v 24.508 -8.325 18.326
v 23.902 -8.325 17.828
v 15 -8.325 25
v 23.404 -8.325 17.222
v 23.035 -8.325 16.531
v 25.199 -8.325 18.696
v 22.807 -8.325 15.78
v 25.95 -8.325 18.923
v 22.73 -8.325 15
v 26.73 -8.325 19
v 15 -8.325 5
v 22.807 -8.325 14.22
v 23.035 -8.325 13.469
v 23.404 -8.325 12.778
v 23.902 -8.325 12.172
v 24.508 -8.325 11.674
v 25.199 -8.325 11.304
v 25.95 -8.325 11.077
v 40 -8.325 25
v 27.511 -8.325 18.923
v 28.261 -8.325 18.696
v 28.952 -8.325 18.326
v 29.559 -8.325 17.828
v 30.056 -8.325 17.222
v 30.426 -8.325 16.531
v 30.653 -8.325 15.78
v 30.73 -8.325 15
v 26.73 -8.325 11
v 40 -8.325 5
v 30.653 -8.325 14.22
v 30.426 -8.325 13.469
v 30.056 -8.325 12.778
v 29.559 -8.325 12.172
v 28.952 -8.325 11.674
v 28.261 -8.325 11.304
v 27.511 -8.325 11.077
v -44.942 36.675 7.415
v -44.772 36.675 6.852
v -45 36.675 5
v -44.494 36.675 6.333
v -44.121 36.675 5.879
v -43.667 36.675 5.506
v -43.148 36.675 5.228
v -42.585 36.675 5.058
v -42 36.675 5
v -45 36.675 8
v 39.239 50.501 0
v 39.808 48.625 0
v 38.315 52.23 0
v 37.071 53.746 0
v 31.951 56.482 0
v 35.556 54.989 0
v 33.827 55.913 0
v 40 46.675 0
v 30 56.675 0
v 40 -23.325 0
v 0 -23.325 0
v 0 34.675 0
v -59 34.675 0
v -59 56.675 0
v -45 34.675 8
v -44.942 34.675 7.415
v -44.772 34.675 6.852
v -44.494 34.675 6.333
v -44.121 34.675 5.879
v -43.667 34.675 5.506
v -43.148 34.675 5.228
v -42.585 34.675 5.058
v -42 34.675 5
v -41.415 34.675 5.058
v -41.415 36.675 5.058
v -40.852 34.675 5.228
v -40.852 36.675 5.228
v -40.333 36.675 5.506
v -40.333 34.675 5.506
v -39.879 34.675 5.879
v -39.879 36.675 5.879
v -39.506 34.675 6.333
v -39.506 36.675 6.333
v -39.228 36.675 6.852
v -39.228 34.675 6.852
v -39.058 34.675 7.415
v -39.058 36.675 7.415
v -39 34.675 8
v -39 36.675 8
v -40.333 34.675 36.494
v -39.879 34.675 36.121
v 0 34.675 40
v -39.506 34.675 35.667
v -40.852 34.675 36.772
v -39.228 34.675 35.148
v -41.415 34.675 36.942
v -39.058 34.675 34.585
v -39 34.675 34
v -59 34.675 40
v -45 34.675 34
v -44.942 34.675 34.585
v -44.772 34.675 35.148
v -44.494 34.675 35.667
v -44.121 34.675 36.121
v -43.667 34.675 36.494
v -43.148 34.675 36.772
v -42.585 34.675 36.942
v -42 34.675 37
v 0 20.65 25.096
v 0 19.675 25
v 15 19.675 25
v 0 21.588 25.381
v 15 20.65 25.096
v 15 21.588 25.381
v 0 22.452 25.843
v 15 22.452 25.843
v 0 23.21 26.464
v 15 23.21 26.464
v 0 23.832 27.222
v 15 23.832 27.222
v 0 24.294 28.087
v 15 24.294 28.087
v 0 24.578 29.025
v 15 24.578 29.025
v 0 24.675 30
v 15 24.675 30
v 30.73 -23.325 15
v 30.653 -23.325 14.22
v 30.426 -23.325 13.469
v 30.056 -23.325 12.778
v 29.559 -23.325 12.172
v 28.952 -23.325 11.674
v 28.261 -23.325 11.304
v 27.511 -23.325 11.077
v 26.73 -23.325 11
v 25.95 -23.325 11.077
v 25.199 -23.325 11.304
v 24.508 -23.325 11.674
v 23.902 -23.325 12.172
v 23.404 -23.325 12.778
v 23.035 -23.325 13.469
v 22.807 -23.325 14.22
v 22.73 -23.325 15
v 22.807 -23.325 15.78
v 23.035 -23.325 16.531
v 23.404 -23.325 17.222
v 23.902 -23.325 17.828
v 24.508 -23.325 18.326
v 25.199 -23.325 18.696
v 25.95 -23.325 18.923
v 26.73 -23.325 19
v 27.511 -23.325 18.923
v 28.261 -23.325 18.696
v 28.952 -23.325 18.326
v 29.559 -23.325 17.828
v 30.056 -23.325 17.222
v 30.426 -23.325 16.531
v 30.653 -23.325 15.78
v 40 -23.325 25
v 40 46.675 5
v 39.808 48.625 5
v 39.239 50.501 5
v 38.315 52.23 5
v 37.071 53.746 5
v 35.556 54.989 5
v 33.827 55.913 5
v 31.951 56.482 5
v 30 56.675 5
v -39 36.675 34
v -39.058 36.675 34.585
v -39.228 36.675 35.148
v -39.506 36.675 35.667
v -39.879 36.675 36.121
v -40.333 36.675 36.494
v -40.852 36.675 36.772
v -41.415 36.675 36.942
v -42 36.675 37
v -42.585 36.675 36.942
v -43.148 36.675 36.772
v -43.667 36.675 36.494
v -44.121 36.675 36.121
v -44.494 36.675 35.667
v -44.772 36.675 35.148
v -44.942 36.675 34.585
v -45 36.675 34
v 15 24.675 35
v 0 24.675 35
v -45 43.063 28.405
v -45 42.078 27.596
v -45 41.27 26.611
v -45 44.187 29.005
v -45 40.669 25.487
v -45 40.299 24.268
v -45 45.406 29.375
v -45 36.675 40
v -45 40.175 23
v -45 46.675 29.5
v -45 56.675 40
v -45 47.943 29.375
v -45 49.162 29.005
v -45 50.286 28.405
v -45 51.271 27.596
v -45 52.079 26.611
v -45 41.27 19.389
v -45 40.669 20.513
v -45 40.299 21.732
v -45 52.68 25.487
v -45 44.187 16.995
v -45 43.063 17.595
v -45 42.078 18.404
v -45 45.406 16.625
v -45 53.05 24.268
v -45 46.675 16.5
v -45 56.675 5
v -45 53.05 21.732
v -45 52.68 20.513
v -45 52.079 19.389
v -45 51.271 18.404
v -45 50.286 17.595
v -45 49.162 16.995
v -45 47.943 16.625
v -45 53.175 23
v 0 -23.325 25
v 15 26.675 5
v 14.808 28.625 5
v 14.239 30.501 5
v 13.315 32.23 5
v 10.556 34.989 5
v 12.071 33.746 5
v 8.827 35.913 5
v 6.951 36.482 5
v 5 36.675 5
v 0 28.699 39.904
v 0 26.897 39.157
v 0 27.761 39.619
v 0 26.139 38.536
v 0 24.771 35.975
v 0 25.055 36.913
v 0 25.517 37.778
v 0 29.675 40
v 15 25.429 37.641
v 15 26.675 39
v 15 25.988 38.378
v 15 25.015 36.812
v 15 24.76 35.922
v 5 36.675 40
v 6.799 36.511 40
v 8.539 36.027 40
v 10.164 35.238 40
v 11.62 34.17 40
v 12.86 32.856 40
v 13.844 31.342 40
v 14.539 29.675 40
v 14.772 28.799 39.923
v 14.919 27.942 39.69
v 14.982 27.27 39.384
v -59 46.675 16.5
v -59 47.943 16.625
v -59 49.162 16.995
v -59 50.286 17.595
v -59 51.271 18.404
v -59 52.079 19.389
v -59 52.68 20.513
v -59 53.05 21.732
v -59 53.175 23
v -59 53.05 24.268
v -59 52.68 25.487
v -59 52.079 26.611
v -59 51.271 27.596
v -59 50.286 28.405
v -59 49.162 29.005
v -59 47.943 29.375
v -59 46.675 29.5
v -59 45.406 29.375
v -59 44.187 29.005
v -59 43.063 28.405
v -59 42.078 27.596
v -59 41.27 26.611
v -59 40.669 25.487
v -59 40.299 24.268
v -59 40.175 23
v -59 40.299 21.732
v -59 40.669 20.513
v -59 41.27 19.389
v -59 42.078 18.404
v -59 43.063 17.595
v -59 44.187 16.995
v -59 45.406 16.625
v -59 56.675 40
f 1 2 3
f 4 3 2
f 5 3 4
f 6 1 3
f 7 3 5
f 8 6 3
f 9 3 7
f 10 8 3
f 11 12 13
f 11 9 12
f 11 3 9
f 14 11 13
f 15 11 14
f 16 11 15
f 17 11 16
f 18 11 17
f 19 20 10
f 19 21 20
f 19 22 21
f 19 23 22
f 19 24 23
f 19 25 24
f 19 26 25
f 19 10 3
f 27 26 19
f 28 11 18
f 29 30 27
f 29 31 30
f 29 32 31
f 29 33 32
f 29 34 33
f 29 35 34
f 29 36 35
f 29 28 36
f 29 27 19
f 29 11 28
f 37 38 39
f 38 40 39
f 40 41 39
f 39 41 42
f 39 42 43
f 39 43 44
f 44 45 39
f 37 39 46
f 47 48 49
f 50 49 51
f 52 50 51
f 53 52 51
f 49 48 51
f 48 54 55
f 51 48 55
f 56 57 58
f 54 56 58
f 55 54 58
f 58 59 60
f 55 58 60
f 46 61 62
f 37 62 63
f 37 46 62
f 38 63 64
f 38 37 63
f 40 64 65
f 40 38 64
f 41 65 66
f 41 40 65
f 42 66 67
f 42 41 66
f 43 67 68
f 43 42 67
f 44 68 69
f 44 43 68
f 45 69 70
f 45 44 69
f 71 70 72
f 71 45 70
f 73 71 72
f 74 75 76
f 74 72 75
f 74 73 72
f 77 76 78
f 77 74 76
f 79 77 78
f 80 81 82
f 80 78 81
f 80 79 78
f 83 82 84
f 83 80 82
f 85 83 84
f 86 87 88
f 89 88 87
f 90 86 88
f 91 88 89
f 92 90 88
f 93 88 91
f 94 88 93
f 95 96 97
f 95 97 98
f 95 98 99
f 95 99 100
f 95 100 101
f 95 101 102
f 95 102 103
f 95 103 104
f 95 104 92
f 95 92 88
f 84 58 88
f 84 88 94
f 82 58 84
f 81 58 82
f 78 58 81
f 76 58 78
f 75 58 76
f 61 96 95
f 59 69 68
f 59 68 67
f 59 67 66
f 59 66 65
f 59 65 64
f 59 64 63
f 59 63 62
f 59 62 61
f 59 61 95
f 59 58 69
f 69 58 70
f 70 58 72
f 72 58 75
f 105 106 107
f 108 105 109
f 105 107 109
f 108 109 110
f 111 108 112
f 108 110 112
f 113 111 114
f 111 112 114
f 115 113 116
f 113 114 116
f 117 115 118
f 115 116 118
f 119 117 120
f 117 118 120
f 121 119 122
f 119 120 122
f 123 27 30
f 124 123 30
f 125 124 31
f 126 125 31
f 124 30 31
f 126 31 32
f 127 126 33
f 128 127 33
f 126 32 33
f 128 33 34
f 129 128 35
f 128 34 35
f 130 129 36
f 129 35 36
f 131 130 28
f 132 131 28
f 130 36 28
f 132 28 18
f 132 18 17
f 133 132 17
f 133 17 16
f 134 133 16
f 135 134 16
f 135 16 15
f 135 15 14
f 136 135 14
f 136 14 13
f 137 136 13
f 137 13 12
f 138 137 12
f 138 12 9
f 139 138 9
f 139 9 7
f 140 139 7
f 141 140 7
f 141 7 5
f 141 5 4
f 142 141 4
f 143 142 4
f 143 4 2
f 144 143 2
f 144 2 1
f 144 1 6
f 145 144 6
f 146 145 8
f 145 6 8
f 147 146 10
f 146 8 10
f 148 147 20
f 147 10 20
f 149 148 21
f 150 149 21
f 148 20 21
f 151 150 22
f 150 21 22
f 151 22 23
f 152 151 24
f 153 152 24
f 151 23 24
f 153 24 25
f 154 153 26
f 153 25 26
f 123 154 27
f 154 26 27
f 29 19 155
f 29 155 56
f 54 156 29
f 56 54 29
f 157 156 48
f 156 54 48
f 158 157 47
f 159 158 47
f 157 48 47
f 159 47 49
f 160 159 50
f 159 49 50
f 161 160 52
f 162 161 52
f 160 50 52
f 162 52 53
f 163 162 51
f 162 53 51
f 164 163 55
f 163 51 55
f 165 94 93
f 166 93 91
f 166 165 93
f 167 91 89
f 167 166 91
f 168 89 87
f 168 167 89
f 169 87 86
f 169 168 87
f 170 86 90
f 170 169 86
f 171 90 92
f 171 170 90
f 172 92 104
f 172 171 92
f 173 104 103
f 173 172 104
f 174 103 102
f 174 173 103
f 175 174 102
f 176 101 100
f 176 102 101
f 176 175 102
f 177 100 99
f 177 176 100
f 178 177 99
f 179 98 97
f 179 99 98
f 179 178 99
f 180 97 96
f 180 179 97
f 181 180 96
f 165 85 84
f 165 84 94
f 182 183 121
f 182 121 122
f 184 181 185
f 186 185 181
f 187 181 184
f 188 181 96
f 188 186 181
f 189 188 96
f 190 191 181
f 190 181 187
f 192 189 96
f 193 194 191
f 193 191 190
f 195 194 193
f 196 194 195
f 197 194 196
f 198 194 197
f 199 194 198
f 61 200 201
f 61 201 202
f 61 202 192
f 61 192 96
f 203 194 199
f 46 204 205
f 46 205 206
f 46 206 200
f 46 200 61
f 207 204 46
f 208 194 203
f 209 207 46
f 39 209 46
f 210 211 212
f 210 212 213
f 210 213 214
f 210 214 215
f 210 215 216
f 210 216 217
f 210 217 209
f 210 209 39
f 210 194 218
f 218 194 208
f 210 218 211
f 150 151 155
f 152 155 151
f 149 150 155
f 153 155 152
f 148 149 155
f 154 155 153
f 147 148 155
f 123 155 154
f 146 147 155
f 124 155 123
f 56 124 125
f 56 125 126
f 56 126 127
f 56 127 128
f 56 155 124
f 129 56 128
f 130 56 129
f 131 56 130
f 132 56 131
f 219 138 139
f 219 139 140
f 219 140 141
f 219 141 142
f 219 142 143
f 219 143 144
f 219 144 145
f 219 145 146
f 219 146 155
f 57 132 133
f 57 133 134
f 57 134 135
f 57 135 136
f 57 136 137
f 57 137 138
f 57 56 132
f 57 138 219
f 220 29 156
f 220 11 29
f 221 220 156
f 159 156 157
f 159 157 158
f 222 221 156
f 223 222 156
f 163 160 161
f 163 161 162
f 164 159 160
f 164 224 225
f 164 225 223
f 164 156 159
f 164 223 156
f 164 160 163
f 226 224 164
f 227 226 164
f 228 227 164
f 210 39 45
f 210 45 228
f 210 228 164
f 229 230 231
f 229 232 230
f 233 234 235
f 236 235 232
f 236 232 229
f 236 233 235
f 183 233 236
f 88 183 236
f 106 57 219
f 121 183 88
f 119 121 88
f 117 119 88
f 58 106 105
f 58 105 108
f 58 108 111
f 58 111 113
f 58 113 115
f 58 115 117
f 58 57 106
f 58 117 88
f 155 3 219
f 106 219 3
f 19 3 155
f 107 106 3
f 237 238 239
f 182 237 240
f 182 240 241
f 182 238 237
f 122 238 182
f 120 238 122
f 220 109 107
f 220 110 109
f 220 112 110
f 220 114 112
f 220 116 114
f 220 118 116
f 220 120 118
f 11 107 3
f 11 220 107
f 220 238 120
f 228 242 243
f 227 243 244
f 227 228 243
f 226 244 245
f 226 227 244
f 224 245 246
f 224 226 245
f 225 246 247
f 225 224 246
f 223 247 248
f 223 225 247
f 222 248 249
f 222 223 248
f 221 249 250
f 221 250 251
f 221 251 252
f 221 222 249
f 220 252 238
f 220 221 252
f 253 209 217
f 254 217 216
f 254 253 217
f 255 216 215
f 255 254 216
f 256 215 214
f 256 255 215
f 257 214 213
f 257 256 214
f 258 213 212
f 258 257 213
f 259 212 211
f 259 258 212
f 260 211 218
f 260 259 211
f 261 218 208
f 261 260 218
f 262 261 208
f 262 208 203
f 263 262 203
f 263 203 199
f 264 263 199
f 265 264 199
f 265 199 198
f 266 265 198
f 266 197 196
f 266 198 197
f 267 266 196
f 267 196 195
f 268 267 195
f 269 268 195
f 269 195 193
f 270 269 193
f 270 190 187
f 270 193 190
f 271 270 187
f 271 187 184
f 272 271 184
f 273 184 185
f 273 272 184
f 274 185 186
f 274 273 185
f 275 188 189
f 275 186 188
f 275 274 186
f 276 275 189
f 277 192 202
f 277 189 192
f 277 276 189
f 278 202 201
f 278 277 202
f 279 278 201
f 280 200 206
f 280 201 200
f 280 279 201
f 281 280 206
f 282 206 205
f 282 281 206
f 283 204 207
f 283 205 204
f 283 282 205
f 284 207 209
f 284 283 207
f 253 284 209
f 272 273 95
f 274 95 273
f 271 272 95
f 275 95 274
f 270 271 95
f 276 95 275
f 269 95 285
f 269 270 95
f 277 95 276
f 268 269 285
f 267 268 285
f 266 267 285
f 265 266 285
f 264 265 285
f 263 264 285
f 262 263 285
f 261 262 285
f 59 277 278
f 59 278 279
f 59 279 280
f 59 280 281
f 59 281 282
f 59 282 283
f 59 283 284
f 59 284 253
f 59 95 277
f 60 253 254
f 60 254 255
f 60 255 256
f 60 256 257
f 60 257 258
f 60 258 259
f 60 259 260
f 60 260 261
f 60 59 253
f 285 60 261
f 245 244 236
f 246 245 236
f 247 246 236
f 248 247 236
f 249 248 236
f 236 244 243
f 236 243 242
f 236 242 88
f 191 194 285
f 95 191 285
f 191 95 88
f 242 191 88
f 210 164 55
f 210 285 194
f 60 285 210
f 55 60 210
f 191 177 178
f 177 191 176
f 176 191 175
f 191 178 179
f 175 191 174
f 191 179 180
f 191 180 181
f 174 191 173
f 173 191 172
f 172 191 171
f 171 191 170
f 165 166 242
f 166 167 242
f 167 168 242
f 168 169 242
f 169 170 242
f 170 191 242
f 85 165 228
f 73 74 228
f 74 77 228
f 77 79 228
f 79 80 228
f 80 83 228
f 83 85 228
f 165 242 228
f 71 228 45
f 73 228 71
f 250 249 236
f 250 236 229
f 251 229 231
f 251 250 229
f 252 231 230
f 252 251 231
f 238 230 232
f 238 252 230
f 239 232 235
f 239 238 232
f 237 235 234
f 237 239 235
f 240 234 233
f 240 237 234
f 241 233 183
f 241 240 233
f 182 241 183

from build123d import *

# Parameters (mm, degrees)
BOSS_EXTRUDE1_DEPTH     = 40
SKETCH2_R               = 4
CUT_EXTRUDE1_DEPTH      = 30
CUT_EXTRUDE2_DEPTH      = 100
CUT_EXTRUDE2_DEPTH_BACK = 100
SKETCH3_R               = 6.5
SKETCH5_W               = 35
SKETCH5_H               = 20
CUT_EXTRUDE3_DEPTH      = 60
SKETCH6_W               = 5
SKETCH6_H               = 65
BOSS_EXTRUDE2_DEPTH     = 25
CUT_EXTRUDE4_DEPTH      = 10
FILLET1_R               = 10
SKETCH8_W               = 40
SKETCH8_H               = 48
CUT_EXTRUDE5_DEPTH      = 15
FILLET2_R               = 5


with BuildPart() as part:
    # Sketch1 → Boss-Extrude1 (new body)
    with BuildSketch(Plane.XY):
        Polygon((40, -23.325428286), (0, -23.325428286), (0, 34.674571714), (-59, 34.674571714), (-59, 56.674571714), (15, 56.674571714), (15, -8.325428286), (40, -8.325428286), align=None)
    extrude(amount=BOSS_EXTRUDE1_DEPTH)

    # Sketch2 → Cut-Extrude1 (cut)
    with BuildSketch(Plane(origin=(0, -8.325428286, 0), x_dir=(1, 0, 0), z_dir=(0, 1, 0))):
        with Locations((26.730150284, -15)):
            Circle(SKETCH2_R)
    extrude(amount=-CUT_EXTRUDE1_DEPTH, mode=Mode.SUBTRACT)

    # Sketch3 → Cut-Extrude2 (cut, two sides: drawn at the far end of the back side and taken through both)
    with BuildSketch(Plane(origin=(-59, 0, 0), x_dir=(0, 0, -1), z_dir=(1, 0, 0)).offset(-CUT_EXTRUDE2_DEPTH_BACK)):
        with Locations((-23, 46.674571714)):
            Circle(SKETCH3_R)
    extrude(amount=CUT_EXTRUDE2_DEPTH + CUT_EXTRUDE2_DEPTH_BACK, mode=Mode.SUBTRACT)

    # Sketch5 → Cut-Extrude3 (cut)
    with BuildSketch(Plane(origin=(15, 0, 0), x_dir=(0, 0, -1), z_dir=(1, 0, 0))):
        with Locations((-22.5, 46.674571714)):
            Rectangle(SKETCH5_W, SKETCH5_H)
    extrude(amount=-CUT_EXTRUDE3_DEPTH, mode=Mode.SUBTRACT)

    # Sketch6 → Boss-Extrude2 (add)
    with BuildSketch(Plane(origin=(15, 0, 0), x_dir=(0, 0, -1), z_dir=(1, 0, 0))):
        with Locations((-2.5, 24.174571714)):
            Rectangle(SKETCH6_W, SKETCH6_H)
    extrude(amount=BOSS_EXTRUDE2_DEPTH)

    # Sketch7 → Cut-Extrude4 (cut)
    with BuildSketch(Plane(origin=(0, 36.674571714, 0), x_dir=(1, 0, 0), z_dir=(0, 1, 0))):
        with BuildLine():
            Line((-39, -8), (-39, -34))
            ThreePointArc((-39, -34), (-42, -37), (-45, -34))
            Line((-45, -34), (-45, -8))
            ThreePointArc((-45, -8), (-42, -5), (-39, -8))
        make_face()
    extrude(amount=-CUT_EXTRUDE4_DEPTH, mode=Mode.SUBTRACT)

    # Fillet1
    fillet1_edges = [part.edges().sort_by_distance(p)[0] for p in [
        (15, 36.674571714, 22.5),
        (40, 56.674571714, 2.5),
    ]]
    fillet(fillet1_edges, radius=FILLET1_R)

    # Sketch8 → Cut-Extrude5 (cut)
    with BuildSketch(Plane.XY.offset(40)):
        with Locations((20, 0.674571714)):
            Rectangle(SKETCH8_W, SKETCH8_H)
    extrude(amount=-CUT_EXTRUDE5_DEPTH, mode=Mode.SUBTRACT)

    # Fillet2
    fillet2_edges = [part.edges().sort_by_distance(p)[0] for p in [
        (7.5, 24.674571714, 40),
        (7.5, 24.674571714, 25),
    ]]
    fillet(fillet2_edges, radius=FILLET2_R)


solid = part.part
